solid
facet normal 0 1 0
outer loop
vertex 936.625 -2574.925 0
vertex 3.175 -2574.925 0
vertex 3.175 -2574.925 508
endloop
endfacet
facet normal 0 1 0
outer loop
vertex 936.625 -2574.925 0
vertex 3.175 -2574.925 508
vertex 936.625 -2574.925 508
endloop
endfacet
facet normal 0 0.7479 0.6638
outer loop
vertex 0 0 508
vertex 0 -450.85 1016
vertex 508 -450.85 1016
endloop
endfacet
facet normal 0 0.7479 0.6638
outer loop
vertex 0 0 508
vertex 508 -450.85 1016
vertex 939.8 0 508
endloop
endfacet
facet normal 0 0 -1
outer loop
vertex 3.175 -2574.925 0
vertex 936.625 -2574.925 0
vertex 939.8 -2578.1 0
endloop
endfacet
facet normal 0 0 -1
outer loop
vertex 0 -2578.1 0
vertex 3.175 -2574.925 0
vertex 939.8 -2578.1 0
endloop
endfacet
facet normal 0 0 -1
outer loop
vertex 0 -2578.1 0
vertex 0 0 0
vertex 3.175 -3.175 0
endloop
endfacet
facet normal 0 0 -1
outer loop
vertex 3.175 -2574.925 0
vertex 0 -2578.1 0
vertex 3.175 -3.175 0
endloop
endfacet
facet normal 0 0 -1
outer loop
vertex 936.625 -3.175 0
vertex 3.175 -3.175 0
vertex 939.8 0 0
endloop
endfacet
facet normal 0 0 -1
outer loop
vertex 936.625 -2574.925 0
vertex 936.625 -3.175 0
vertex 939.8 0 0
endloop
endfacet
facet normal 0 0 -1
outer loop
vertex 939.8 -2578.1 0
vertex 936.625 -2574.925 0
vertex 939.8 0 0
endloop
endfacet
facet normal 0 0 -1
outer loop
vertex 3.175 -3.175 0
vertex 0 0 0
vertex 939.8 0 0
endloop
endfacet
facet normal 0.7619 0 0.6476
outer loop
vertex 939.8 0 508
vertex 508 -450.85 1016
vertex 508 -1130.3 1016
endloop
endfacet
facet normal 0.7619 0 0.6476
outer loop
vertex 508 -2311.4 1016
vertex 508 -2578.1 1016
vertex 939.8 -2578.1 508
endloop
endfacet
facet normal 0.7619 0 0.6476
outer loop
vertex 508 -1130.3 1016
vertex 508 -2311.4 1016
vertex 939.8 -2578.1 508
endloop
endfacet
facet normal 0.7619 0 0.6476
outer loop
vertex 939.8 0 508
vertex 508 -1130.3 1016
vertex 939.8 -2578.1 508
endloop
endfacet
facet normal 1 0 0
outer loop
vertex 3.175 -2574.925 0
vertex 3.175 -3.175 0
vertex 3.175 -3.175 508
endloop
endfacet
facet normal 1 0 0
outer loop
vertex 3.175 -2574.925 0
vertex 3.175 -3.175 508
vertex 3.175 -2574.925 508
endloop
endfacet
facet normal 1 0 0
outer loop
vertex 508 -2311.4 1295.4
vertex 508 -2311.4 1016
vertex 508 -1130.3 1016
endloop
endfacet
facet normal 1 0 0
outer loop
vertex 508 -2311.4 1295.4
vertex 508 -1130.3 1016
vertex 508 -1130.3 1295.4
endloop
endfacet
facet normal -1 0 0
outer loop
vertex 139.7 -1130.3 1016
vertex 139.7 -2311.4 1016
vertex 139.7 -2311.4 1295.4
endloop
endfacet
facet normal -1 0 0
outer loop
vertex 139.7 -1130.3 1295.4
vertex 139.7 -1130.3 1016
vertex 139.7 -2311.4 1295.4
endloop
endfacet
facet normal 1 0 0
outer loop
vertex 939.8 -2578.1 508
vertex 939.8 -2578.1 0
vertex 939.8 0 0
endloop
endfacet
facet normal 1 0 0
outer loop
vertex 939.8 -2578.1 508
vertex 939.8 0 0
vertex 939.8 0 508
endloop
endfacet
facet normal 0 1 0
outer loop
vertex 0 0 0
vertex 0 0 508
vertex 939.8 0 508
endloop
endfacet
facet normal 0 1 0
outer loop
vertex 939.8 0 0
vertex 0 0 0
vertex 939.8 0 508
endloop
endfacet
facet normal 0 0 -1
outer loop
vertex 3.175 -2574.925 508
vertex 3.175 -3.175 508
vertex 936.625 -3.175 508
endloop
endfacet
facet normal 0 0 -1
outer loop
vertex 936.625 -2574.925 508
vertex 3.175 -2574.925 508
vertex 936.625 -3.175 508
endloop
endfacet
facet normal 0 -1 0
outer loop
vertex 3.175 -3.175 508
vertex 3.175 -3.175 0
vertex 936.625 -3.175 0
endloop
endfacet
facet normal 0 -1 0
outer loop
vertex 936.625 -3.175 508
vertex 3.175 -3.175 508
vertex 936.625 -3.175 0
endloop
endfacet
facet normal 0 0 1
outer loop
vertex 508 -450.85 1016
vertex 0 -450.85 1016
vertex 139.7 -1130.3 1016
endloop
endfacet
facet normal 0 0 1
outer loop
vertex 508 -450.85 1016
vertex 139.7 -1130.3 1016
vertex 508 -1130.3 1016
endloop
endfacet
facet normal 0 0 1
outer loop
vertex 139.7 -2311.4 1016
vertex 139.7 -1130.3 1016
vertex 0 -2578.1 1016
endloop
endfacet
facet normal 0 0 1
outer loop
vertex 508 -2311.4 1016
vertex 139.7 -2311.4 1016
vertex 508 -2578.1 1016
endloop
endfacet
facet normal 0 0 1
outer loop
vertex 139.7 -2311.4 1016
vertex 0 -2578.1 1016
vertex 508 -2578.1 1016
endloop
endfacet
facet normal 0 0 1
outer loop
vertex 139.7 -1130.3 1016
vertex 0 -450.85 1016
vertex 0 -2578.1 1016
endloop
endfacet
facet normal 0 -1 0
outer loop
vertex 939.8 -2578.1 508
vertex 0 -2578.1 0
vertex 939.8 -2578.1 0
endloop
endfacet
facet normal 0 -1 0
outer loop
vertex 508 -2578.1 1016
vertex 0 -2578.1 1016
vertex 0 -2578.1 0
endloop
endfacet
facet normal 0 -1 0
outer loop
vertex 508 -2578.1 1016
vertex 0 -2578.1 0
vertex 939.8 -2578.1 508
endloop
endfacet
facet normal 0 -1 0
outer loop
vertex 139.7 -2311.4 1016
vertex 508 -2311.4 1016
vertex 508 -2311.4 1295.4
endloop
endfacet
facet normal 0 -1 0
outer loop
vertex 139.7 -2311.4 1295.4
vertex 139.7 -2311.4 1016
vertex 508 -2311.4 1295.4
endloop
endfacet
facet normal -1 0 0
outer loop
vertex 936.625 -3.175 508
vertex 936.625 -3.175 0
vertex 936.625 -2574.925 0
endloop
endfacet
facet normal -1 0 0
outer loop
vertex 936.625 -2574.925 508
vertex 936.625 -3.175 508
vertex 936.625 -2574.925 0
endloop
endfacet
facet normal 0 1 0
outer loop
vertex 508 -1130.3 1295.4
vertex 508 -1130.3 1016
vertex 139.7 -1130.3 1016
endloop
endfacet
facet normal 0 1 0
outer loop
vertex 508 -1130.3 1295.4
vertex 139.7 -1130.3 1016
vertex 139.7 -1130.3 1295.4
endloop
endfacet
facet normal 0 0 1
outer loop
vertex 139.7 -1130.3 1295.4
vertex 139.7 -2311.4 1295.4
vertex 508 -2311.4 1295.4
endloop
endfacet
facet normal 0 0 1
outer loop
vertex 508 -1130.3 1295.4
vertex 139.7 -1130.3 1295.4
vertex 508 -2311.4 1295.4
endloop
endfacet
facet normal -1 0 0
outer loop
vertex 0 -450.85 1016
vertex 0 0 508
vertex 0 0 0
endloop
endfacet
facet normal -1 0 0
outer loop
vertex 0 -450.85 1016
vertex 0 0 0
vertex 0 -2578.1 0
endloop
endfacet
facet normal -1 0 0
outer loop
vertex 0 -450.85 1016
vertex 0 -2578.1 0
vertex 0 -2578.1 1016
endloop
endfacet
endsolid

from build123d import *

# Parameters (mm, degrees)
F0_W      = 939.8
F0_H      = 1295.4
F1_DEPTH  = 2578.1
F2_W      = 139.7
F2_H      = 279.4
F3_DEPTH  = 2578.1
F4_W      = 431.8
F4_H      = 279.4
F5_DEPTH  = 2578.1
F7_DEPTH  = 2578.1
F9_DEPTH  = 939.801
F10_W     = 1130.3
F10_H     = 279.4
F11_DEPTH = 368.3
F12_W     = 266.7
F12_H     = 279.4
F13_DEPTH = 368.3
F14_W     = 933.45
F14_H     = 2571.75
F15_DEPTH = 508


with BuildPart() as f1:
    # F0 (on Front) → F1 (new body)
    with BuildSketch(Plane.XZ):
        with Locations((469.9, 647.7)):
            Rectangle(F0_W, F0_H)
    extrude(amount=F1_DEPTH)

    # F2 (on face) → F3 (cut, through all)
    with BuildSketch(Plane.XZ.offset(2578.1)):
        with Locations((69.85, 1155.7)):
            Rectangle(F2_W, F2_H)
    extrude(amount=-F3_DEPTH, mode=Mode.SUBTRACT)

    # F4 (on face) → F5 (cut, through all)
    with BuildSketch(Plane.XZ.offset(2578.1)):
        with Locations((723.9, 1155.7)):
            Rectangle(F4_W, F4_H)
    extrude(amount=-F5_DEPTH, mode=Mode.SUBTRACT)

    # F6 (on face) → F7 (cut, through all)
    with BuildSketch(Plane.XZ.offset(2578.1)):
        Polygon((939.8, 1016), (508, 1016), (939.8, 508), align=None)
    extrude(amount=-F7_DEPTH, mode=Mode.SUBTRACT)

    # F8 (on Right) → F9 (cut, through all)
    with BuildSketch(Plane.YZ):
        Polygon((-450.85, 1016), (0, 508), (0, 1016), align=None)
    extrude(amount=F9_DEPTH, mode=Mode.SUBTRACT)

    # F10 (on face) → F11 (cut, through all)
    with BuildSketch(Plane.YZ.offset(508)):
        with Locations((-565.1499999999, 1155.7)):
            Rectangle(F10_W, F10_H)
    extrude(amount=-F11_DEPTH, mode=Mode.SUBTRACT)

    # F12 (on face) → F13 (cut, through all)
    with BuildSketch(Plane.YZ.offset(508)):
        with Locations((-2444.75, 1155.7)):
            Rectangle(F12_W, F12_H)
    extrude(amount=-F13_DEPTH, mode=Mode.SUBTRACT)

    # F14 (on face) → F15 (cut)
    with BuildSketch(Plane(origin=(0, 0, 0), x_dir=(1, 0, 0), z_dir=(0, 0, -1))):
        with Locations((469.9, 1289.05)):
            Rectangle(F14_W, F14_H)
    extrude(amount=-F15_DEPTH, mode=Mode.SUBTRACT)


solid = f1.part
